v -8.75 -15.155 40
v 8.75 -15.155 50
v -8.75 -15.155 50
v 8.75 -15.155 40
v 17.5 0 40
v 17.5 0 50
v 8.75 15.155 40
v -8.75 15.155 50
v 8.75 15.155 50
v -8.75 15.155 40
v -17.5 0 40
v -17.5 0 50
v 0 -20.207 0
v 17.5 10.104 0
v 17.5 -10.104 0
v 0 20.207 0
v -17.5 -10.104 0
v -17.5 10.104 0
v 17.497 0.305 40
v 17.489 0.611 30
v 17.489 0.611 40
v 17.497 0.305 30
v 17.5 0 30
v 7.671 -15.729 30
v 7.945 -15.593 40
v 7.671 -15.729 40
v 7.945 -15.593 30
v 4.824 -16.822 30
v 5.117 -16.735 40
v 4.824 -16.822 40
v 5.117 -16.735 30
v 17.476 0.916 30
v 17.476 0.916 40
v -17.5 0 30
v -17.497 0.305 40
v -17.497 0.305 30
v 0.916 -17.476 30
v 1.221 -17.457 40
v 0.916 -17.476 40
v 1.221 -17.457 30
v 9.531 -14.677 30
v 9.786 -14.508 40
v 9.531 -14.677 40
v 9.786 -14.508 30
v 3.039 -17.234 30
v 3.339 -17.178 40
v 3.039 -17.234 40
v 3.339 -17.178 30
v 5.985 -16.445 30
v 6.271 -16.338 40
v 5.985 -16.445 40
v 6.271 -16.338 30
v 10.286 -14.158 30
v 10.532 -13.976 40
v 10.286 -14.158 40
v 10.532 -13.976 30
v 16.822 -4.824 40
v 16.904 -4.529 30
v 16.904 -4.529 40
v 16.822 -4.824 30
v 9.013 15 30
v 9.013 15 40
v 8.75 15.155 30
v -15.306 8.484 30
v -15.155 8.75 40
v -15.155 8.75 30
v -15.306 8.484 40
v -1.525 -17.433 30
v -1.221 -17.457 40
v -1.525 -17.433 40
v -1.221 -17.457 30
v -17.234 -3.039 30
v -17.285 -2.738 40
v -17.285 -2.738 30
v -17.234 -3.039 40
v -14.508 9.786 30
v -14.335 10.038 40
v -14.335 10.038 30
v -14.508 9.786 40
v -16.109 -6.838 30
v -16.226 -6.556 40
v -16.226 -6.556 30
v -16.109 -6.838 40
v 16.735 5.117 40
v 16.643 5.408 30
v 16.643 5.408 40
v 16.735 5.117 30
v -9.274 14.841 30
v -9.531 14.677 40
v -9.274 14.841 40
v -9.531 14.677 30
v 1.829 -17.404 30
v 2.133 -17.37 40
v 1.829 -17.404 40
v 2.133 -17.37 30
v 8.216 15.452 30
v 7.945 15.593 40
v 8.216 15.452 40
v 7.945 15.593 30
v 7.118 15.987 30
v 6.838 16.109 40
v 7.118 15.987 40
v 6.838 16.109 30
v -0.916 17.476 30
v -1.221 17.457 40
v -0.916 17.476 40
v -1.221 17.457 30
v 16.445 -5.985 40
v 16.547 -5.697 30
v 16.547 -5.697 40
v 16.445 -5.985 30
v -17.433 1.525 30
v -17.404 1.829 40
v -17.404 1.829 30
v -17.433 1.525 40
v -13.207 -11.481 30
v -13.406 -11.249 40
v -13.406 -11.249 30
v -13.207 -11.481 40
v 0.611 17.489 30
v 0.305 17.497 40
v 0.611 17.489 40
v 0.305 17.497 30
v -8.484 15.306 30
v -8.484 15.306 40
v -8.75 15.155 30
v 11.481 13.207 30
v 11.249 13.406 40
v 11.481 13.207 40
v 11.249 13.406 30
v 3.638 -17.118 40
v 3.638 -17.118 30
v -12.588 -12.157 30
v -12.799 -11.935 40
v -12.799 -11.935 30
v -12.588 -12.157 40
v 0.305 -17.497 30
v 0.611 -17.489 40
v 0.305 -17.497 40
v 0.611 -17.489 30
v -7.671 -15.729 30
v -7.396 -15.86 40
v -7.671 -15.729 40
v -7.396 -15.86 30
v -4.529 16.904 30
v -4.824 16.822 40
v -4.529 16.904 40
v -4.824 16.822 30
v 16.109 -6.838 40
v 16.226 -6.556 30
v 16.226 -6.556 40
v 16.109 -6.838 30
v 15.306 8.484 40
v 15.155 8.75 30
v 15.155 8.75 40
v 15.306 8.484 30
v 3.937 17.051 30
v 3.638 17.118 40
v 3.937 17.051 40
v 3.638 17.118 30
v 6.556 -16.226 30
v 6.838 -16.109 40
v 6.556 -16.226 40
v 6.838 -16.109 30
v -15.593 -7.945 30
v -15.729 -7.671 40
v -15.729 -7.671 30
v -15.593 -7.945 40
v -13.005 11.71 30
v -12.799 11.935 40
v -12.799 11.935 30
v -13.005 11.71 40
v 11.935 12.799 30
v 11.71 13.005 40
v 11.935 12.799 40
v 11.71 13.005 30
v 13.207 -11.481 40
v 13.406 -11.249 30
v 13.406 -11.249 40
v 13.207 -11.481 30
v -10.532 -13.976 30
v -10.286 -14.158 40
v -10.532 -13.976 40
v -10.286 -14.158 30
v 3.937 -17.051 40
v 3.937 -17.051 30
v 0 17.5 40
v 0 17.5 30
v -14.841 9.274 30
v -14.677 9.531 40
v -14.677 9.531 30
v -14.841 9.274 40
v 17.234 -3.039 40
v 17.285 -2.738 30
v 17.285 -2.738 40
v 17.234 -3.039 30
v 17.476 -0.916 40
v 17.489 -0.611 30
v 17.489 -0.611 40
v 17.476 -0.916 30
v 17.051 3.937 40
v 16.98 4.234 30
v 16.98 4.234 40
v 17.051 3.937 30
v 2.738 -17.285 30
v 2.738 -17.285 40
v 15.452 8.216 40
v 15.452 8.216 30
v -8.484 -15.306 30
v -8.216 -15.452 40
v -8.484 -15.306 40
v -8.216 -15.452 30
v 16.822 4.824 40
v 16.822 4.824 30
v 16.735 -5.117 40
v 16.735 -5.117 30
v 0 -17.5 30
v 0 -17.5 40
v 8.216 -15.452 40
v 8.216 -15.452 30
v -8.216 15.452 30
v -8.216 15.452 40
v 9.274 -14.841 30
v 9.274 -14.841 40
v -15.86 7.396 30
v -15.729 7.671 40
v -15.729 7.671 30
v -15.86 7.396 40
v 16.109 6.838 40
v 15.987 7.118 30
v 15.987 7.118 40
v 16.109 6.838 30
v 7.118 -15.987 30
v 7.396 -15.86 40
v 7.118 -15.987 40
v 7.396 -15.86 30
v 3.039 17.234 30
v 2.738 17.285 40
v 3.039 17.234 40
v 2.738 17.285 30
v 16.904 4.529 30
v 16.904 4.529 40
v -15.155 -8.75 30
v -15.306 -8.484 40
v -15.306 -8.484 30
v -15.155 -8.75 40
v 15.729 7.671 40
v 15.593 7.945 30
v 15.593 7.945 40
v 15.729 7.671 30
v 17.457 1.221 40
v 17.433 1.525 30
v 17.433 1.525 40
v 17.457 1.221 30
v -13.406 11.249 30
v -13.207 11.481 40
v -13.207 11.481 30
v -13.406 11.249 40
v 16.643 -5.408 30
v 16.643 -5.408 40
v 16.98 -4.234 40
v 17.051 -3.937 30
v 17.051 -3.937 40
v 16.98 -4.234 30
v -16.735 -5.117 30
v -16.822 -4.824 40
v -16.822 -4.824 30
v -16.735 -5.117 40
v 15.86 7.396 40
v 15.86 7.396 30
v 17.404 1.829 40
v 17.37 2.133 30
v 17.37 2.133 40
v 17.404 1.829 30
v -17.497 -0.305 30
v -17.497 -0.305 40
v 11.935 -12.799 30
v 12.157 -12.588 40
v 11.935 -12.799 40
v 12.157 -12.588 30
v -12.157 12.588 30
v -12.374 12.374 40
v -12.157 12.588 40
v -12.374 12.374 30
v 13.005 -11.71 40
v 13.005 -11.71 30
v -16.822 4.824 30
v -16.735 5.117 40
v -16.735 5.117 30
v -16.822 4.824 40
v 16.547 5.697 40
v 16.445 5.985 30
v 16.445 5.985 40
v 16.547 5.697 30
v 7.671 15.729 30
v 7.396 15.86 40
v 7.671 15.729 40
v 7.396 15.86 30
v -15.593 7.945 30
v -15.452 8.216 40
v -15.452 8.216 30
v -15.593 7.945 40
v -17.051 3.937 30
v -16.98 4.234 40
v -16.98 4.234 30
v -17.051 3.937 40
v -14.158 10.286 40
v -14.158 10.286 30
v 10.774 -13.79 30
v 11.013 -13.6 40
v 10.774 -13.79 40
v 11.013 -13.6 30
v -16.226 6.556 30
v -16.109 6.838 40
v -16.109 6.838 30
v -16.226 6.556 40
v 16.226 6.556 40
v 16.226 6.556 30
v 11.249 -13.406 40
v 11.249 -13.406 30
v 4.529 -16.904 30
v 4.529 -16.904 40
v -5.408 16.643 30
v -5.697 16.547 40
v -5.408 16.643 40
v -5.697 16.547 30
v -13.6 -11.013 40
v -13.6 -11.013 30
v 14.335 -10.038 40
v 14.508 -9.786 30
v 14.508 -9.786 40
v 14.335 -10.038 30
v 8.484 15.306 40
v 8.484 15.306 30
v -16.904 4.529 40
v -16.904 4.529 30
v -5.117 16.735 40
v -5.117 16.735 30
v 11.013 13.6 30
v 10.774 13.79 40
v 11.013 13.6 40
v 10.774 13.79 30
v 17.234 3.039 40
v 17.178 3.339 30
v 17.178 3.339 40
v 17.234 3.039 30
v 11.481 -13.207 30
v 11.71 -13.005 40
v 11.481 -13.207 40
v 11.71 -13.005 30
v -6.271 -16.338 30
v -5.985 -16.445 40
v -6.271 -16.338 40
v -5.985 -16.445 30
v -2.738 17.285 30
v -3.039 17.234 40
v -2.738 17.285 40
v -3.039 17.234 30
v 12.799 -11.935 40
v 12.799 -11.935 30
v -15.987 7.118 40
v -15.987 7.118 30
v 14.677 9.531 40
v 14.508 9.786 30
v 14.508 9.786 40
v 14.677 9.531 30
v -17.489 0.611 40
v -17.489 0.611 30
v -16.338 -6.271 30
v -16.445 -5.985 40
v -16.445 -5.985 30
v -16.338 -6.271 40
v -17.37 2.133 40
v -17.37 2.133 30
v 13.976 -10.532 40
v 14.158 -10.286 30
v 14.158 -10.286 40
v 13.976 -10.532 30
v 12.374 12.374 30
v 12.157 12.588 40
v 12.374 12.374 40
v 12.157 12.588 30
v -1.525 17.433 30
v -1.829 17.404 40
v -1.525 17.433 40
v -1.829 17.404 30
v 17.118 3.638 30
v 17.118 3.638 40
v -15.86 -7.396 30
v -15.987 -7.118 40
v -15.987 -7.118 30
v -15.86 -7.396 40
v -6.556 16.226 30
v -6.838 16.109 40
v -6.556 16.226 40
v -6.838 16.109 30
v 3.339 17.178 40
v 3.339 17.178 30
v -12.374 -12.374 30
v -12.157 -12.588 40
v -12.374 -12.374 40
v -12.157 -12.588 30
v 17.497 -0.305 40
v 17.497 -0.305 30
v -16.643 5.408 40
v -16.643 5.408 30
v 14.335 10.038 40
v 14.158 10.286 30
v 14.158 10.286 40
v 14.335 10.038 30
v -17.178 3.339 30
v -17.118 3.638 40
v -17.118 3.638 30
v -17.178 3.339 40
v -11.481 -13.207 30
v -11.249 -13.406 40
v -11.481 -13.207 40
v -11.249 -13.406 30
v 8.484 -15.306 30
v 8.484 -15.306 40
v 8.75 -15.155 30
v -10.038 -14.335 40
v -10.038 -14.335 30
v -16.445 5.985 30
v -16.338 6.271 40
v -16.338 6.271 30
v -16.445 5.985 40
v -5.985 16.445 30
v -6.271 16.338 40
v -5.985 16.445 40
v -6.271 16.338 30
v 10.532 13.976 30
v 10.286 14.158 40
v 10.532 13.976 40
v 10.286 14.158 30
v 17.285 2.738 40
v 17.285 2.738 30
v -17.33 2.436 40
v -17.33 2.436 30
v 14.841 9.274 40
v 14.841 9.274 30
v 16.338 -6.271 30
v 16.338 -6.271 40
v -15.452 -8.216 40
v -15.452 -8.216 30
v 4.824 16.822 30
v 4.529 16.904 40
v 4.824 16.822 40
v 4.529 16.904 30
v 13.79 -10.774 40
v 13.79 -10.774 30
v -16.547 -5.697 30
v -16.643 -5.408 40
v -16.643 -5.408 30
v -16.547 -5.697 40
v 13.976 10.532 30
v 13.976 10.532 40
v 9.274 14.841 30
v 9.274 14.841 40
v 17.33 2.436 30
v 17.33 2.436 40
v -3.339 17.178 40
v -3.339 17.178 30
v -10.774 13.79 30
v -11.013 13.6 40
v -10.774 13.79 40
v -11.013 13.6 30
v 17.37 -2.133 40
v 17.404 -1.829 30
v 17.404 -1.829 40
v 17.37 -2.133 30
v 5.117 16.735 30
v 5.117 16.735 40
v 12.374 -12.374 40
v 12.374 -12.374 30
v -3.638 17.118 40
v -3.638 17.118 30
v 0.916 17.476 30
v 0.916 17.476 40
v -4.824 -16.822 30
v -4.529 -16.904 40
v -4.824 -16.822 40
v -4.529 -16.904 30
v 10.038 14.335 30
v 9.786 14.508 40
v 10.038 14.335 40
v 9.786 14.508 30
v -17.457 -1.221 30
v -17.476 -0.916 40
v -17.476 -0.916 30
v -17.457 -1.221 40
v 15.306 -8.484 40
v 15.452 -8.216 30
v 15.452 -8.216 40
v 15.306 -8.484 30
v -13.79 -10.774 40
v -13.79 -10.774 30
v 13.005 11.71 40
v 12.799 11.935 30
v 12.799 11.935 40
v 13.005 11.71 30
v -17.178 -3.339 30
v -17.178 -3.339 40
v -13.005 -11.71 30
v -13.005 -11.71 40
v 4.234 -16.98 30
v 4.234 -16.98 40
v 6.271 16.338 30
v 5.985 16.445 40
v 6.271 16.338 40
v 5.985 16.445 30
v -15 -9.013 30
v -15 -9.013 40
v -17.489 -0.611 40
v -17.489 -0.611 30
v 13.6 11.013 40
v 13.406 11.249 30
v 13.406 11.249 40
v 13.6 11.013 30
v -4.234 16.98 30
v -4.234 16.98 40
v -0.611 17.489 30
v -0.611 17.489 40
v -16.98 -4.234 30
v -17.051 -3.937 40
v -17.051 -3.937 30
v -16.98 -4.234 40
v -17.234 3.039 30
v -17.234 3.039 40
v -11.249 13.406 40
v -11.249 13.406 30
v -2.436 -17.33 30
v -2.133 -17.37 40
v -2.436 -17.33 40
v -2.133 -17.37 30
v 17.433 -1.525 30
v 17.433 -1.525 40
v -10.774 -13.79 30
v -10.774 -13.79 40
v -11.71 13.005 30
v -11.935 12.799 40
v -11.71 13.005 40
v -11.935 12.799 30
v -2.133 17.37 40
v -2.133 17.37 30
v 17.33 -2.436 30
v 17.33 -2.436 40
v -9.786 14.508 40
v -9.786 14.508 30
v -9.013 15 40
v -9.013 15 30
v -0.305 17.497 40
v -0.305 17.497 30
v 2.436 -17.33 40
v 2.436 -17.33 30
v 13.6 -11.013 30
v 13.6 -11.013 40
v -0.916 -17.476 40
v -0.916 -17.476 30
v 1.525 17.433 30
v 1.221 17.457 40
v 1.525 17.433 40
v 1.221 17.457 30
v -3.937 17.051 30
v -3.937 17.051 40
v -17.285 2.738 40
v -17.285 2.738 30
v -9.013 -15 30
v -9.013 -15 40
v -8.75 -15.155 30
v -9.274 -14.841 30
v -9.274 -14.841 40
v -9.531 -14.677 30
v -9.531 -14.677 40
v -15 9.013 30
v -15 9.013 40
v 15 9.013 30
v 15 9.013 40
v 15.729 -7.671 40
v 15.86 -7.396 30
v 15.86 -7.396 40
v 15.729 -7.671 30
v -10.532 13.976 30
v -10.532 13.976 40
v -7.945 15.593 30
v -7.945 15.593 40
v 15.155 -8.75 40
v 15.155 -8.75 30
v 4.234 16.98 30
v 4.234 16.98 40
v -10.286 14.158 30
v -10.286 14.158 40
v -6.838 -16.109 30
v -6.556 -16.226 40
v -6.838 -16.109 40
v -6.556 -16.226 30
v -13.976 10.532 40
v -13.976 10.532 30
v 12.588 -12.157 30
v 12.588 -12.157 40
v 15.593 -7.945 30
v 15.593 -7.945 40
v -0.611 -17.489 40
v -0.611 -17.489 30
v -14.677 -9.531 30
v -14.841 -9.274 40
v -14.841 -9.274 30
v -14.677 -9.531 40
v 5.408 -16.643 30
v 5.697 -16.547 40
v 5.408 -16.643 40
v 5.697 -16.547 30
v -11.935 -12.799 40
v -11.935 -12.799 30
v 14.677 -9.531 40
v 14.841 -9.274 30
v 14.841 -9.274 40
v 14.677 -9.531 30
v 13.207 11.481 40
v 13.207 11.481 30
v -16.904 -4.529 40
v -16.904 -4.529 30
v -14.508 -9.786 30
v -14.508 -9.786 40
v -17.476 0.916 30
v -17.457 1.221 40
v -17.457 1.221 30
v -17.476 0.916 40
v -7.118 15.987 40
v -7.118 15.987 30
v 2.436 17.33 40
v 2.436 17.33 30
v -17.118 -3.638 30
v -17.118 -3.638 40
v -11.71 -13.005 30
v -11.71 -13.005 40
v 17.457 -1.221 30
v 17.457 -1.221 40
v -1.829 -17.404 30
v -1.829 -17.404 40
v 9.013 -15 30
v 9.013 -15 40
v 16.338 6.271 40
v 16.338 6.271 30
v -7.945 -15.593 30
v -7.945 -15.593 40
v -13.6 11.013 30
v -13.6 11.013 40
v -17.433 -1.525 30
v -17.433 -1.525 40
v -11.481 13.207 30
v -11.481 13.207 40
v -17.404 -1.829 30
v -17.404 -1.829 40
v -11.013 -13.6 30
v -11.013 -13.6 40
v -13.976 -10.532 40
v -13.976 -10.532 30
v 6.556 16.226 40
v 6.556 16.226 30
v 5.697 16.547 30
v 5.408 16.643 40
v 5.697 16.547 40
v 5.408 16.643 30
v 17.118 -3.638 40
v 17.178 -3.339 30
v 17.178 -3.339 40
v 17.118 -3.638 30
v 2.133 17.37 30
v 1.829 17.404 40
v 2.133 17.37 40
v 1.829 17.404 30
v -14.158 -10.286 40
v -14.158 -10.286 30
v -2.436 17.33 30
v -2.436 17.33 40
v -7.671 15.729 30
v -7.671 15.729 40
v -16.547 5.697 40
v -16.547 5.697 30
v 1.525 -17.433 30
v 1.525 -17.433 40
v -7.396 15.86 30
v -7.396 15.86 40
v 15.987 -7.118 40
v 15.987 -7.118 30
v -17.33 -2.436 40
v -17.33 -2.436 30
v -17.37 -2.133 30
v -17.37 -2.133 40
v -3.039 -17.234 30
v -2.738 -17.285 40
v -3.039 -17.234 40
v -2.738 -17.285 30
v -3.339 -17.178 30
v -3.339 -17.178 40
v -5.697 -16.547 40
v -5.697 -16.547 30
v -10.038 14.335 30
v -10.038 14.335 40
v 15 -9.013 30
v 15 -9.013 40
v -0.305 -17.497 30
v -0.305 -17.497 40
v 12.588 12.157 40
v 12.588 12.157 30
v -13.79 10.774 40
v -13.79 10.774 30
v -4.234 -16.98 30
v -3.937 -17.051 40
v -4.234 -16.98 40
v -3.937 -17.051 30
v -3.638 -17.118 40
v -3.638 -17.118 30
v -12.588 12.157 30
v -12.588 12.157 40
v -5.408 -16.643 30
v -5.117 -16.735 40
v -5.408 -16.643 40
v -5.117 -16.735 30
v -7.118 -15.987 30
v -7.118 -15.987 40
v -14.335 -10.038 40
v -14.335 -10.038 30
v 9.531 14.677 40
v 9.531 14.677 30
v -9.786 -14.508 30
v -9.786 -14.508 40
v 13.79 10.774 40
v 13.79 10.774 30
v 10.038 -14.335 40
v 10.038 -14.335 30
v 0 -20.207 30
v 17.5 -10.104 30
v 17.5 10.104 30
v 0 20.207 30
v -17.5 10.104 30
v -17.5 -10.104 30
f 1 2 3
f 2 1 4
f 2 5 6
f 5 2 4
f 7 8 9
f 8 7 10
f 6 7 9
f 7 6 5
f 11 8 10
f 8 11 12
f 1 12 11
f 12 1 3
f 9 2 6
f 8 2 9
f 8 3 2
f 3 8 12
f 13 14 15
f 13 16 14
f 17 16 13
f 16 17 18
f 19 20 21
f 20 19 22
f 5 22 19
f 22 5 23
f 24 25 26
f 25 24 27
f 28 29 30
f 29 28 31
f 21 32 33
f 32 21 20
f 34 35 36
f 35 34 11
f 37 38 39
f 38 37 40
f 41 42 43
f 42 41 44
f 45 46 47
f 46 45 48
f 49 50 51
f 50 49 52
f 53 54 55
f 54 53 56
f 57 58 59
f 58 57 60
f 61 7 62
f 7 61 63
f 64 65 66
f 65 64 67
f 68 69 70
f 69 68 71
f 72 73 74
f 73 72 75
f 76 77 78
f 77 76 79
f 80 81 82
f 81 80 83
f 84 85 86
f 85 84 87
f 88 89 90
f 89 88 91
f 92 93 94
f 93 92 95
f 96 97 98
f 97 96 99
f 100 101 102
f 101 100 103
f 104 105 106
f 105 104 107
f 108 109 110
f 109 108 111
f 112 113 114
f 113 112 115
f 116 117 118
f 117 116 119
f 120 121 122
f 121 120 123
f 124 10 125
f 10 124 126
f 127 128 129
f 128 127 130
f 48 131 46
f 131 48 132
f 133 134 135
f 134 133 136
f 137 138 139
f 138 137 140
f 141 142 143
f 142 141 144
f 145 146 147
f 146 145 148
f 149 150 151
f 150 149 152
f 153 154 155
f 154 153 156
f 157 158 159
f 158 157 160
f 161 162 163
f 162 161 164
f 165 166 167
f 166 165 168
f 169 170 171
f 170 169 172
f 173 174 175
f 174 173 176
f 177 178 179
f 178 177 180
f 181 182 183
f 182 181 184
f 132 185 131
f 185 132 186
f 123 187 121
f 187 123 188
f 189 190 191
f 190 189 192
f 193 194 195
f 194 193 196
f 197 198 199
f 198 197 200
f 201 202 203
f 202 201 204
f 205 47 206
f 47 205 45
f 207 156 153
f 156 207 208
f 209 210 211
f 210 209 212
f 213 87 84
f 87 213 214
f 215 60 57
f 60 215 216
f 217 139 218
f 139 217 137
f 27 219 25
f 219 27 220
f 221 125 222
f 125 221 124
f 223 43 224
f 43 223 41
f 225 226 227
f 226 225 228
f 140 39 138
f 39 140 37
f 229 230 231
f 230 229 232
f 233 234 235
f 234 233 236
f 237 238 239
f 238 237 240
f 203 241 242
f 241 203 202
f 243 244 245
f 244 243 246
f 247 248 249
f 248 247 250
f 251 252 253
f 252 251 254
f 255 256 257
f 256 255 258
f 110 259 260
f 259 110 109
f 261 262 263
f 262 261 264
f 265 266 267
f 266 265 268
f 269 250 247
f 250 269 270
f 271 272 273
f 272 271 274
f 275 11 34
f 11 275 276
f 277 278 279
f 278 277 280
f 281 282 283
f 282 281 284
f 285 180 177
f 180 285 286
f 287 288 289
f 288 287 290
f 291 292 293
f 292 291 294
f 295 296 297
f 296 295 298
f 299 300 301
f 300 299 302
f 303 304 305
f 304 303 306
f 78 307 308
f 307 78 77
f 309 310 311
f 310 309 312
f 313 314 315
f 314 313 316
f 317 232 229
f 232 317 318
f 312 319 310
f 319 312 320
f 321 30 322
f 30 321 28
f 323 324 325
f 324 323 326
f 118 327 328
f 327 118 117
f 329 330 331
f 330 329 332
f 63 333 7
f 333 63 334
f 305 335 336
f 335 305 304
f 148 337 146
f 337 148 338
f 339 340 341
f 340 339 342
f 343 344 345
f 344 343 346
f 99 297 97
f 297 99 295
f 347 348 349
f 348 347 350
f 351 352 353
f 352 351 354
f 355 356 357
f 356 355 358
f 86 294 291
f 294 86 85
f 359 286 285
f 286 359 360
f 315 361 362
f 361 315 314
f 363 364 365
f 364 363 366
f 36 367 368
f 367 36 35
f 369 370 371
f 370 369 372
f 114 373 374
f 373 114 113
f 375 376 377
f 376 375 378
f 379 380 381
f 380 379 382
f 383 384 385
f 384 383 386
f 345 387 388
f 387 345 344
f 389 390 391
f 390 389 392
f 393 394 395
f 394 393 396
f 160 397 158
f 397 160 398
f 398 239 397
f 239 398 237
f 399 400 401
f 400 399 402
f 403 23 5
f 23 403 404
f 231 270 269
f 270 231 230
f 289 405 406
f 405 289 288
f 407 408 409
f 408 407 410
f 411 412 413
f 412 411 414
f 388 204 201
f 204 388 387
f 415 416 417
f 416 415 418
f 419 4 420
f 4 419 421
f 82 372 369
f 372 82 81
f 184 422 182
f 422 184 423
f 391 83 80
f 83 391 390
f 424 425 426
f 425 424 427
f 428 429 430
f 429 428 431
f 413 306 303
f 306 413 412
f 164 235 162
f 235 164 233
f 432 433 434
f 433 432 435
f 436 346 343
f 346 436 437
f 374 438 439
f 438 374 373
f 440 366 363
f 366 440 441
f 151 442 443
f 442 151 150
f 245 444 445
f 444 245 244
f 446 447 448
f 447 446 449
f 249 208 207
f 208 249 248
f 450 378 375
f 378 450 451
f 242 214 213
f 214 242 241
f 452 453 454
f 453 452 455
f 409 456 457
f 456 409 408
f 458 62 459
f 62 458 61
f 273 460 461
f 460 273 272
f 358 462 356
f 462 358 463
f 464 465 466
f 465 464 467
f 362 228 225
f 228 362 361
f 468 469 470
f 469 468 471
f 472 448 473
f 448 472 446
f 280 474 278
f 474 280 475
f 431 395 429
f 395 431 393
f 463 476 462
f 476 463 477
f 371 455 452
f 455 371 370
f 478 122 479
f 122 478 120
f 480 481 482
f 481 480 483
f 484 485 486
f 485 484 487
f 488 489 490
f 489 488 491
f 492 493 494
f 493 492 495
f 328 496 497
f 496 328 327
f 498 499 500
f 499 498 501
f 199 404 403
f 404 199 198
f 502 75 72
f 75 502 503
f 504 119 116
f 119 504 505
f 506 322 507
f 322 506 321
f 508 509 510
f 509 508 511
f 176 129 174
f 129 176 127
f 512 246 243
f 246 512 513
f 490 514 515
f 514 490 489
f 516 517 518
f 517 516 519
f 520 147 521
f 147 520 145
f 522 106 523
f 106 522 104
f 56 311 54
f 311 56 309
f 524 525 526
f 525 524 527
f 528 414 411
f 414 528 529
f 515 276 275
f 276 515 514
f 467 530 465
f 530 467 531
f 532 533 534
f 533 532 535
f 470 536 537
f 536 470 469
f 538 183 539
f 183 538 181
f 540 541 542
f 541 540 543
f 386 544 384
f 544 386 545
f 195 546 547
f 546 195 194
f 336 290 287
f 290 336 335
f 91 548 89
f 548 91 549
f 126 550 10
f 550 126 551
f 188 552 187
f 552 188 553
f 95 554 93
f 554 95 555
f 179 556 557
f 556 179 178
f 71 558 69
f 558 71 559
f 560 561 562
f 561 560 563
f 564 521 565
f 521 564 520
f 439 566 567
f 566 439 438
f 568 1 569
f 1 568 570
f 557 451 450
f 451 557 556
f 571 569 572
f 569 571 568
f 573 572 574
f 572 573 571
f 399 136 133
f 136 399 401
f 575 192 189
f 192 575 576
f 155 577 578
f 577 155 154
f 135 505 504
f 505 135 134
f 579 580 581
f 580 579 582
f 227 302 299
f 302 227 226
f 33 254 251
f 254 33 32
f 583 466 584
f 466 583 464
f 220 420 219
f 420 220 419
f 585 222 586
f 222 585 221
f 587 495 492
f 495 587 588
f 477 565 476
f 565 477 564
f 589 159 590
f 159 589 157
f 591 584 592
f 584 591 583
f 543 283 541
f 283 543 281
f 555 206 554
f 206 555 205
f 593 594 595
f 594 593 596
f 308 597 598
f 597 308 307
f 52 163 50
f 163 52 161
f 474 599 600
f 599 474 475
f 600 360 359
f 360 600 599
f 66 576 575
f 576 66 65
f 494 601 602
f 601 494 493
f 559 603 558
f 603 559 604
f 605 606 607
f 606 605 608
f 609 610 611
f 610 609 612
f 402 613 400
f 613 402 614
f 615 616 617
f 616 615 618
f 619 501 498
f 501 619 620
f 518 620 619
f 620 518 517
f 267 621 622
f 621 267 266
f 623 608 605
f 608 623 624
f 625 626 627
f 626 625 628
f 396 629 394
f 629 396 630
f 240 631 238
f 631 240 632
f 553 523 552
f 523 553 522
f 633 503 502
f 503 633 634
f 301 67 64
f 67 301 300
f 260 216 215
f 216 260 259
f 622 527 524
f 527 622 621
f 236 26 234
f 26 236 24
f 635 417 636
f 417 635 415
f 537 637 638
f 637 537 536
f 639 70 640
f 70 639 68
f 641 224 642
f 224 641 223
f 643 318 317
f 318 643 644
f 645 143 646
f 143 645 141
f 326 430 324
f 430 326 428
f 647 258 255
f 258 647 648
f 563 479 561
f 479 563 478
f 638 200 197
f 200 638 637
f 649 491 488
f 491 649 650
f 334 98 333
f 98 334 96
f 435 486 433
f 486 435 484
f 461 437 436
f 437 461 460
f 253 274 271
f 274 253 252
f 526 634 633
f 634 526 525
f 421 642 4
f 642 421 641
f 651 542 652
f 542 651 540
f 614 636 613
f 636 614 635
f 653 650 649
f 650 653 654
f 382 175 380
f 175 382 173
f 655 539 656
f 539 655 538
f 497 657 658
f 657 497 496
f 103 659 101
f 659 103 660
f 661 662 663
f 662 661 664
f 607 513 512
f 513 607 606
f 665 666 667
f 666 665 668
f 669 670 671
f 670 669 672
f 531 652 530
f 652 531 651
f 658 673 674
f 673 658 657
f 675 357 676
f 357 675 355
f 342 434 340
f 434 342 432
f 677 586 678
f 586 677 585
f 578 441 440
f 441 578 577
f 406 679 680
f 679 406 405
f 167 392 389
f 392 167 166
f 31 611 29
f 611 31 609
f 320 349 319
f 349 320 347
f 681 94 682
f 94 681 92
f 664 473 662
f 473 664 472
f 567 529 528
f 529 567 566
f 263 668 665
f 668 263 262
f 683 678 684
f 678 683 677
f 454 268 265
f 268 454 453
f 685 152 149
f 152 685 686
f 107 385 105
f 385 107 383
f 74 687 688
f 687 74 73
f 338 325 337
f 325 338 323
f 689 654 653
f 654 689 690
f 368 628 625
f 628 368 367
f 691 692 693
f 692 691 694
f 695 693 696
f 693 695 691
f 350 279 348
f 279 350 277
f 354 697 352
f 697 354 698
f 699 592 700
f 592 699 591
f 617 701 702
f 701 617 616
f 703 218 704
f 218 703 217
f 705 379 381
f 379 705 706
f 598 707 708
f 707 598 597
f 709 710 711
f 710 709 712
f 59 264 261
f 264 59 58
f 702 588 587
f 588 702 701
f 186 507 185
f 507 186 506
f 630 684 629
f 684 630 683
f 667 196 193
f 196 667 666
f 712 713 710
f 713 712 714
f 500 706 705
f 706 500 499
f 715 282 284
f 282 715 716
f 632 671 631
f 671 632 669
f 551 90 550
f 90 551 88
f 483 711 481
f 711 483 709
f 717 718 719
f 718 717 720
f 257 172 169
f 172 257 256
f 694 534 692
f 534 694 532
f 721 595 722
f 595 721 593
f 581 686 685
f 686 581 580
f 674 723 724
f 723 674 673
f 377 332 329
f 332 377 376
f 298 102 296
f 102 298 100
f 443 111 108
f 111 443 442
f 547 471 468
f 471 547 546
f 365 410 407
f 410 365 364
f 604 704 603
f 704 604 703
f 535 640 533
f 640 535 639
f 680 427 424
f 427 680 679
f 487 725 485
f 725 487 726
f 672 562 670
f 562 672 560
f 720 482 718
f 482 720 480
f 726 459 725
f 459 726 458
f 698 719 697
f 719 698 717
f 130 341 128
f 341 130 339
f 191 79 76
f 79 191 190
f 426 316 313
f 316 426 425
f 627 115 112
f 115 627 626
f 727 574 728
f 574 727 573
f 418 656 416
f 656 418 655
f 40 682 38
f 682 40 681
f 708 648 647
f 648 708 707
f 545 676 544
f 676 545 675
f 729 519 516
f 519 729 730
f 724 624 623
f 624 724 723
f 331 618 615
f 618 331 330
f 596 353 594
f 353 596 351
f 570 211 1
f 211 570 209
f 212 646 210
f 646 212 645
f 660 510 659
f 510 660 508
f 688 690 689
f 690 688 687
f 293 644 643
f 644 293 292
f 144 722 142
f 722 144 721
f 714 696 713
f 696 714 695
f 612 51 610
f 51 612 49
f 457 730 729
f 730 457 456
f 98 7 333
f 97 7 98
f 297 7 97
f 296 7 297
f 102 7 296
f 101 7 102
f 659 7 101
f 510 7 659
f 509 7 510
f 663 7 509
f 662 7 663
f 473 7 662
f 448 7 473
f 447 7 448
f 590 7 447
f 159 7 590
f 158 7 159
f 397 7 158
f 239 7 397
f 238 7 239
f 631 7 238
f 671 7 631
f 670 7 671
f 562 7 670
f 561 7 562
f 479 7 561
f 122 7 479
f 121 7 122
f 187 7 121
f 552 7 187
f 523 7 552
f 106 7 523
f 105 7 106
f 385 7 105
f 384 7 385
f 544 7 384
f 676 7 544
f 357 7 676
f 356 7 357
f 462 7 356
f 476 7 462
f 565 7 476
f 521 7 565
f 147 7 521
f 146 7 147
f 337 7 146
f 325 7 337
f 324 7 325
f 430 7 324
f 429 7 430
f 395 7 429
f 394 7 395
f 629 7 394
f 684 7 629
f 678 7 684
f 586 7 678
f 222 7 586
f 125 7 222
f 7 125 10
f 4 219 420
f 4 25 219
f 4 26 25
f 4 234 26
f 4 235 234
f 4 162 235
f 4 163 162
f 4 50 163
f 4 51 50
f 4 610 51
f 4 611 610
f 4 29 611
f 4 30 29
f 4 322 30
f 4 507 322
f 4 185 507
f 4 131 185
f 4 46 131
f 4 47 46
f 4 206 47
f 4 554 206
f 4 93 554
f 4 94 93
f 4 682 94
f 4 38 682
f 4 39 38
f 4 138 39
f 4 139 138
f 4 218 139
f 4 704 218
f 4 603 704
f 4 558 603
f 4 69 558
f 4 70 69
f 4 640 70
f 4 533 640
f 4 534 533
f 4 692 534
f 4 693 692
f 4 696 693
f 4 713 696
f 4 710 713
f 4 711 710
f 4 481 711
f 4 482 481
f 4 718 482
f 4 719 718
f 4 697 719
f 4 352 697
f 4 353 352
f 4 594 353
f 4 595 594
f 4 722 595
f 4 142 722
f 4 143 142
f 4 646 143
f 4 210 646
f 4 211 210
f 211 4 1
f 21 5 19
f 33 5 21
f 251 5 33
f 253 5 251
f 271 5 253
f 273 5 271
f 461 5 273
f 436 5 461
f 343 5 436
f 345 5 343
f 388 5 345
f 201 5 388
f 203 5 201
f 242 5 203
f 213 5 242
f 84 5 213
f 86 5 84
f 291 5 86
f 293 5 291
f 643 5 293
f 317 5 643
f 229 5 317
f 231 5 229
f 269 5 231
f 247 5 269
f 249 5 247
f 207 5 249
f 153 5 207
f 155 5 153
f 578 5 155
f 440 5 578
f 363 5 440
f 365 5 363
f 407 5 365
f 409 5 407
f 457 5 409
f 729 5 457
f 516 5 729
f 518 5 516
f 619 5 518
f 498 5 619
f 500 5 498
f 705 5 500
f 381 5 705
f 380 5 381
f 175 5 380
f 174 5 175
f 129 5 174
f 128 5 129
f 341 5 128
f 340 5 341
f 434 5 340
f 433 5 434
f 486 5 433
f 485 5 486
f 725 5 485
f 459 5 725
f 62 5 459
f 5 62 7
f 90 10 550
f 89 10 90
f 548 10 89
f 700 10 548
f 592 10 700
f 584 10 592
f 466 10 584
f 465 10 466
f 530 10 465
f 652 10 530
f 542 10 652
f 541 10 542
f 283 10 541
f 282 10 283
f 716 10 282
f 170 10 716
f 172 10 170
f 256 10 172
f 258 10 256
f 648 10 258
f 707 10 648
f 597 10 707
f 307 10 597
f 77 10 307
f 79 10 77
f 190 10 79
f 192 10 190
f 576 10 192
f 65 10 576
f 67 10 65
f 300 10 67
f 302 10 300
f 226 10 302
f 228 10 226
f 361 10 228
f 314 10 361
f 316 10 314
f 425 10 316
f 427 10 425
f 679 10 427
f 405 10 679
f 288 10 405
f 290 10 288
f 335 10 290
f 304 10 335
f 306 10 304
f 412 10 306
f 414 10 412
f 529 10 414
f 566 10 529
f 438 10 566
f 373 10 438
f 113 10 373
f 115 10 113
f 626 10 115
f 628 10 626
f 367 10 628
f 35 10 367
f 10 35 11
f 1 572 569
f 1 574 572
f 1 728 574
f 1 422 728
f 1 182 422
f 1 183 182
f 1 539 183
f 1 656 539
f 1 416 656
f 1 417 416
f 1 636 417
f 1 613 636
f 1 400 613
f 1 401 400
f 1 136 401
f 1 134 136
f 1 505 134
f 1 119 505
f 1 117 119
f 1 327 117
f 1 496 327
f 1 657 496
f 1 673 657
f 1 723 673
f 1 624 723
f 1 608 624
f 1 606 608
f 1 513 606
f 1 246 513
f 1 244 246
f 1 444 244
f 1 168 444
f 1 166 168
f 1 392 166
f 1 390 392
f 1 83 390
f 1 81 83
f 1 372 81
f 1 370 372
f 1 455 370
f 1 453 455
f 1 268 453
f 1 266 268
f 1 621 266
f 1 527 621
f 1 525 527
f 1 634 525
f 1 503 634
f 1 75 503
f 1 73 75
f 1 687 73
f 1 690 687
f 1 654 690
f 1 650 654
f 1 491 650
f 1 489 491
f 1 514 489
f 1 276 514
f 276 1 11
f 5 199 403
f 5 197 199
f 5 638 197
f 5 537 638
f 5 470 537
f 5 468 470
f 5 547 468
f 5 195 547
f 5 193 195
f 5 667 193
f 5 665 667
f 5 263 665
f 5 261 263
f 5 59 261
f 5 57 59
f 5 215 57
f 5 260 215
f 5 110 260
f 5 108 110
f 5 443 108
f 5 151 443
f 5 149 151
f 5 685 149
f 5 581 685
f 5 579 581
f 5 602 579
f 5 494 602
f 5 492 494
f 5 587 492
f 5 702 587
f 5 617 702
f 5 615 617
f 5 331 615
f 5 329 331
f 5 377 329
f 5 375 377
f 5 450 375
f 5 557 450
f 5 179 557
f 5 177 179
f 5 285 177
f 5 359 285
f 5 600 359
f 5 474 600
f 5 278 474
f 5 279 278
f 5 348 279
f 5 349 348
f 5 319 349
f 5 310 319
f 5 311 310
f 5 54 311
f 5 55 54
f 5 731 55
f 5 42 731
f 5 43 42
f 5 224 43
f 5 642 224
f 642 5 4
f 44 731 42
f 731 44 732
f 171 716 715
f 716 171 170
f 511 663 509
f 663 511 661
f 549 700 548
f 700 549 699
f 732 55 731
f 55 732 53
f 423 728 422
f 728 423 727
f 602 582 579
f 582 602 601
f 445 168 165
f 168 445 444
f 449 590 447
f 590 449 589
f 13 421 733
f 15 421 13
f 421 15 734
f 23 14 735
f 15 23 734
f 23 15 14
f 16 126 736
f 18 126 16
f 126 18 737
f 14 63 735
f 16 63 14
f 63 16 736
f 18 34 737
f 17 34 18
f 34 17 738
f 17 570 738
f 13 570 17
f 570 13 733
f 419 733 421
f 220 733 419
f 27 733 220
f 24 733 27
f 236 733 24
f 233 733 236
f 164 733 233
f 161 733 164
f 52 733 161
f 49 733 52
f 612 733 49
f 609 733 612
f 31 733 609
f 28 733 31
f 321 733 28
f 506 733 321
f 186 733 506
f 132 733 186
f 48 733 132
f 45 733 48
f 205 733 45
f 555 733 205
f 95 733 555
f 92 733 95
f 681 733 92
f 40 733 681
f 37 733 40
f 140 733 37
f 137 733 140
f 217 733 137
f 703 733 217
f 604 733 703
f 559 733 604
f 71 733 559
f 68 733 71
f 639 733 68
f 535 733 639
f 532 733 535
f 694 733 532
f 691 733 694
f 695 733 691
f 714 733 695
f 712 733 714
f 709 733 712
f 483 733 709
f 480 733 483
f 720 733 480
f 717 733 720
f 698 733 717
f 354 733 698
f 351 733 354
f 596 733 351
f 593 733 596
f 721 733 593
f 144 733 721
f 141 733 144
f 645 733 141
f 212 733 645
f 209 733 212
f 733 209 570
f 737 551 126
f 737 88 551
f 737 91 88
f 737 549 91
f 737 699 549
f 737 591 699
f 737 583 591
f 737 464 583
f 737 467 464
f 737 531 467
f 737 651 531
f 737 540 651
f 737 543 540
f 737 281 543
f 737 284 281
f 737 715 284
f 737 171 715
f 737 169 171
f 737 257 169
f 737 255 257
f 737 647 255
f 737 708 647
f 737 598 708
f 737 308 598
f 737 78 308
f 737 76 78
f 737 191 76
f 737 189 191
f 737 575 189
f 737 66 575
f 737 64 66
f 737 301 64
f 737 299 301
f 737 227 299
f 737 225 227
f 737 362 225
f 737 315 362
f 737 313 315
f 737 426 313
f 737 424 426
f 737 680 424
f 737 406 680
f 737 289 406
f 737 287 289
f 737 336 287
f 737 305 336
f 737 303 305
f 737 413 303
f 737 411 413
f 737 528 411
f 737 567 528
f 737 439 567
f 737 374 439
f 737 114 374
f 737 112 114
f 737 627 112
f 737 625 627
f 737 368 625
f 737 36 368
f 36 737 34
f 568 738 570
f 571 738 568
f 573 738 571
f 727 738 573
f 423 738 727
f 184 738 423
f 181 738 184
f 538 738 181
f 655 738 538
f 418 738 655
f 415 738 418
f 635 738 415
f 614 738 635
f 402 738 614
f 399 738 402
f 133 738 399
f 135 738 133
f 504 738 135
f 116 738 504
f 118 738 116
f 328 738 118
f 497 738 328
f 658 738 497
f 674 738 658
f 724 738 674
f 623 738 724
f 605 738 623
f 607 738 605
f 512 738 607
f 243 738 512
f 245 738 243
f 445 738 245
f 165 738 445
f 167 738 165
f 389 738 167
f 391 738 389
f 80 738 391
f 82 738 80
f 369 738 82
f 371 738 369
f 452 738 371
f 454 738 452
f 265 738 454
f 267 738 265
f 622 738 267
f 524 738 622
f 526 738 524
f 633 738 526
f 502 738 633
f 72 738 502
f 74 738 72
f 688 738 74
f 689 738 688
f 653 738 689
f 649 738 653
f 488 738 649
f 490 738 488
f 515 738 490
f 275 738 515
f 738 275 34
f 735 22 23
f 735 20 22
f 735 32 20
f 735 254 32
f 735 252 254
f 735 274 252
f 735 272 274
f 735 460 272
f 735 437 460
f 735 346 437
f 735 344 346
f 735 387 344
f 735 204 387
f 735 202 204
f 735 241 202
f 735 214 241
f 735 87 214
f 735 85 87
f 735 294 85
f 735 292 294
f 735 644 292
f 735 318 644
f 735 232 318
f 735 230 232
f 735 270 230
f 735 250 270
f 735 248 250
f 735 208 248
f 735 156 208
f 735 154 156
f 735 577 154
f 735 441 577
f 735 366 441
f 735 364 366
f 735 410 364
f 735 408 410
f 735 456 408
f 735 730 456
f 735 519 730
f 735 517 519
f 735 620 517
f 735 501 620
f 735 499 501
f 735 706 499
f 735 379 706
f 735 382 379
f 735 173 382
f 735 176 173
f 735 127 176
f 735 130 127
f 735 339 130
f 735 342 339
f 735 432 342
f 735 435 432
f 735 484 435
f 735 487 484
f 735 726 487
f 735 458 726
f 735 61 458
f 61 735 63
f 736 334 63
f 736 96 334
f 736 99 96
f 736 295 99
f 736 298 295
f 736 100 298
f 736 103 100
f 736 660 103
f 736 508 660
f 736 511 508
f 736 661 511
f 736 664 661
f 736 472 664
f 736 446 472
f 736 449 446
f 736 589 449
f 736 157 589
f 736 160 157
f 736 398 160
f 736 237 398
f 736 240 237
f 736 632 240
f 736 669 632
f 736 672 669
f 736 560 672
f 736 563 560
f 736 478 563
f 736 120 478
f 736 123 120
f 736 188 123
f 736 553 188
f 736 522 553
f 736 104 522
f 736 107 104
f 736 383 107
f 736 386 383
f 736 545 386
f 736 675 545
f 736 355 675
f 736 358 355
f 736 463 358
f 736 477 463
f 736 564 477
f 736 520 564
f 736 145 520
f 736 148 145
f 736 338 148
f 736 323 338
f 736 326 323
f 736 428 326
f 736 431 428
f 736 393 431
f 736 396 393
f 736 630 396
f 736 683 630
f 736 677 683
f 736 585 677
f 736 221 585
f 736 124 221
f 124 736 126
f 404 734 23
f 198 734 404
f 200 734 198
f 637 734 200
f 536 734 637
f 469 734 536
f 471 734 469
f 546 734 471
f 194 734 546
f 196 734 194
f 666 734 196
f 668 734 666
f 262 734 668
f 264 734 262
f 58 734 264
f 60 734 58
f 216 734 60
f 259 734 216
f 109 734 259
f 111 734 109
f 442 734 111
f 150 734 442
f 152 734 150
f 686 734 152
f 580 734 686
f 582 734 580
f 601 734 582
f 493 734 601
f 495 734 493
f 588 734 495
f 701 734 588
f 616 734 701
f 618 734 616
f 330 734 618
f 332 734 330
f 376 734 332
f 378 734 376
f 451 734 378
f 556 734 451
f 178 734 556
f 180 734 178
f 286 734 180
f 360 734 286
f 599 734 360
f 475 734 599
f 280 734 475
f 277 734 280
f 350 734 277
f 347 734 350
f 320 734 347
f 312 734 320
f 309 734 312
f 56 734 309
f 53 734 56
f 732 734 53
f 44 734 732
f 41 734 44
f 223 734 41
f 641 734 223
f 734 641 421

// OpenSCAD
$fn = 6;

fudge = 1/cos(180/$fn);

color("green") cylinder(h = 50, d = 35);

color("gold") cylinder(h = 40, d = 35, $fn = 360);

color("red") rotate([0,0,180/$fn]) cylinder(h=30, d = 35 * fudge);
